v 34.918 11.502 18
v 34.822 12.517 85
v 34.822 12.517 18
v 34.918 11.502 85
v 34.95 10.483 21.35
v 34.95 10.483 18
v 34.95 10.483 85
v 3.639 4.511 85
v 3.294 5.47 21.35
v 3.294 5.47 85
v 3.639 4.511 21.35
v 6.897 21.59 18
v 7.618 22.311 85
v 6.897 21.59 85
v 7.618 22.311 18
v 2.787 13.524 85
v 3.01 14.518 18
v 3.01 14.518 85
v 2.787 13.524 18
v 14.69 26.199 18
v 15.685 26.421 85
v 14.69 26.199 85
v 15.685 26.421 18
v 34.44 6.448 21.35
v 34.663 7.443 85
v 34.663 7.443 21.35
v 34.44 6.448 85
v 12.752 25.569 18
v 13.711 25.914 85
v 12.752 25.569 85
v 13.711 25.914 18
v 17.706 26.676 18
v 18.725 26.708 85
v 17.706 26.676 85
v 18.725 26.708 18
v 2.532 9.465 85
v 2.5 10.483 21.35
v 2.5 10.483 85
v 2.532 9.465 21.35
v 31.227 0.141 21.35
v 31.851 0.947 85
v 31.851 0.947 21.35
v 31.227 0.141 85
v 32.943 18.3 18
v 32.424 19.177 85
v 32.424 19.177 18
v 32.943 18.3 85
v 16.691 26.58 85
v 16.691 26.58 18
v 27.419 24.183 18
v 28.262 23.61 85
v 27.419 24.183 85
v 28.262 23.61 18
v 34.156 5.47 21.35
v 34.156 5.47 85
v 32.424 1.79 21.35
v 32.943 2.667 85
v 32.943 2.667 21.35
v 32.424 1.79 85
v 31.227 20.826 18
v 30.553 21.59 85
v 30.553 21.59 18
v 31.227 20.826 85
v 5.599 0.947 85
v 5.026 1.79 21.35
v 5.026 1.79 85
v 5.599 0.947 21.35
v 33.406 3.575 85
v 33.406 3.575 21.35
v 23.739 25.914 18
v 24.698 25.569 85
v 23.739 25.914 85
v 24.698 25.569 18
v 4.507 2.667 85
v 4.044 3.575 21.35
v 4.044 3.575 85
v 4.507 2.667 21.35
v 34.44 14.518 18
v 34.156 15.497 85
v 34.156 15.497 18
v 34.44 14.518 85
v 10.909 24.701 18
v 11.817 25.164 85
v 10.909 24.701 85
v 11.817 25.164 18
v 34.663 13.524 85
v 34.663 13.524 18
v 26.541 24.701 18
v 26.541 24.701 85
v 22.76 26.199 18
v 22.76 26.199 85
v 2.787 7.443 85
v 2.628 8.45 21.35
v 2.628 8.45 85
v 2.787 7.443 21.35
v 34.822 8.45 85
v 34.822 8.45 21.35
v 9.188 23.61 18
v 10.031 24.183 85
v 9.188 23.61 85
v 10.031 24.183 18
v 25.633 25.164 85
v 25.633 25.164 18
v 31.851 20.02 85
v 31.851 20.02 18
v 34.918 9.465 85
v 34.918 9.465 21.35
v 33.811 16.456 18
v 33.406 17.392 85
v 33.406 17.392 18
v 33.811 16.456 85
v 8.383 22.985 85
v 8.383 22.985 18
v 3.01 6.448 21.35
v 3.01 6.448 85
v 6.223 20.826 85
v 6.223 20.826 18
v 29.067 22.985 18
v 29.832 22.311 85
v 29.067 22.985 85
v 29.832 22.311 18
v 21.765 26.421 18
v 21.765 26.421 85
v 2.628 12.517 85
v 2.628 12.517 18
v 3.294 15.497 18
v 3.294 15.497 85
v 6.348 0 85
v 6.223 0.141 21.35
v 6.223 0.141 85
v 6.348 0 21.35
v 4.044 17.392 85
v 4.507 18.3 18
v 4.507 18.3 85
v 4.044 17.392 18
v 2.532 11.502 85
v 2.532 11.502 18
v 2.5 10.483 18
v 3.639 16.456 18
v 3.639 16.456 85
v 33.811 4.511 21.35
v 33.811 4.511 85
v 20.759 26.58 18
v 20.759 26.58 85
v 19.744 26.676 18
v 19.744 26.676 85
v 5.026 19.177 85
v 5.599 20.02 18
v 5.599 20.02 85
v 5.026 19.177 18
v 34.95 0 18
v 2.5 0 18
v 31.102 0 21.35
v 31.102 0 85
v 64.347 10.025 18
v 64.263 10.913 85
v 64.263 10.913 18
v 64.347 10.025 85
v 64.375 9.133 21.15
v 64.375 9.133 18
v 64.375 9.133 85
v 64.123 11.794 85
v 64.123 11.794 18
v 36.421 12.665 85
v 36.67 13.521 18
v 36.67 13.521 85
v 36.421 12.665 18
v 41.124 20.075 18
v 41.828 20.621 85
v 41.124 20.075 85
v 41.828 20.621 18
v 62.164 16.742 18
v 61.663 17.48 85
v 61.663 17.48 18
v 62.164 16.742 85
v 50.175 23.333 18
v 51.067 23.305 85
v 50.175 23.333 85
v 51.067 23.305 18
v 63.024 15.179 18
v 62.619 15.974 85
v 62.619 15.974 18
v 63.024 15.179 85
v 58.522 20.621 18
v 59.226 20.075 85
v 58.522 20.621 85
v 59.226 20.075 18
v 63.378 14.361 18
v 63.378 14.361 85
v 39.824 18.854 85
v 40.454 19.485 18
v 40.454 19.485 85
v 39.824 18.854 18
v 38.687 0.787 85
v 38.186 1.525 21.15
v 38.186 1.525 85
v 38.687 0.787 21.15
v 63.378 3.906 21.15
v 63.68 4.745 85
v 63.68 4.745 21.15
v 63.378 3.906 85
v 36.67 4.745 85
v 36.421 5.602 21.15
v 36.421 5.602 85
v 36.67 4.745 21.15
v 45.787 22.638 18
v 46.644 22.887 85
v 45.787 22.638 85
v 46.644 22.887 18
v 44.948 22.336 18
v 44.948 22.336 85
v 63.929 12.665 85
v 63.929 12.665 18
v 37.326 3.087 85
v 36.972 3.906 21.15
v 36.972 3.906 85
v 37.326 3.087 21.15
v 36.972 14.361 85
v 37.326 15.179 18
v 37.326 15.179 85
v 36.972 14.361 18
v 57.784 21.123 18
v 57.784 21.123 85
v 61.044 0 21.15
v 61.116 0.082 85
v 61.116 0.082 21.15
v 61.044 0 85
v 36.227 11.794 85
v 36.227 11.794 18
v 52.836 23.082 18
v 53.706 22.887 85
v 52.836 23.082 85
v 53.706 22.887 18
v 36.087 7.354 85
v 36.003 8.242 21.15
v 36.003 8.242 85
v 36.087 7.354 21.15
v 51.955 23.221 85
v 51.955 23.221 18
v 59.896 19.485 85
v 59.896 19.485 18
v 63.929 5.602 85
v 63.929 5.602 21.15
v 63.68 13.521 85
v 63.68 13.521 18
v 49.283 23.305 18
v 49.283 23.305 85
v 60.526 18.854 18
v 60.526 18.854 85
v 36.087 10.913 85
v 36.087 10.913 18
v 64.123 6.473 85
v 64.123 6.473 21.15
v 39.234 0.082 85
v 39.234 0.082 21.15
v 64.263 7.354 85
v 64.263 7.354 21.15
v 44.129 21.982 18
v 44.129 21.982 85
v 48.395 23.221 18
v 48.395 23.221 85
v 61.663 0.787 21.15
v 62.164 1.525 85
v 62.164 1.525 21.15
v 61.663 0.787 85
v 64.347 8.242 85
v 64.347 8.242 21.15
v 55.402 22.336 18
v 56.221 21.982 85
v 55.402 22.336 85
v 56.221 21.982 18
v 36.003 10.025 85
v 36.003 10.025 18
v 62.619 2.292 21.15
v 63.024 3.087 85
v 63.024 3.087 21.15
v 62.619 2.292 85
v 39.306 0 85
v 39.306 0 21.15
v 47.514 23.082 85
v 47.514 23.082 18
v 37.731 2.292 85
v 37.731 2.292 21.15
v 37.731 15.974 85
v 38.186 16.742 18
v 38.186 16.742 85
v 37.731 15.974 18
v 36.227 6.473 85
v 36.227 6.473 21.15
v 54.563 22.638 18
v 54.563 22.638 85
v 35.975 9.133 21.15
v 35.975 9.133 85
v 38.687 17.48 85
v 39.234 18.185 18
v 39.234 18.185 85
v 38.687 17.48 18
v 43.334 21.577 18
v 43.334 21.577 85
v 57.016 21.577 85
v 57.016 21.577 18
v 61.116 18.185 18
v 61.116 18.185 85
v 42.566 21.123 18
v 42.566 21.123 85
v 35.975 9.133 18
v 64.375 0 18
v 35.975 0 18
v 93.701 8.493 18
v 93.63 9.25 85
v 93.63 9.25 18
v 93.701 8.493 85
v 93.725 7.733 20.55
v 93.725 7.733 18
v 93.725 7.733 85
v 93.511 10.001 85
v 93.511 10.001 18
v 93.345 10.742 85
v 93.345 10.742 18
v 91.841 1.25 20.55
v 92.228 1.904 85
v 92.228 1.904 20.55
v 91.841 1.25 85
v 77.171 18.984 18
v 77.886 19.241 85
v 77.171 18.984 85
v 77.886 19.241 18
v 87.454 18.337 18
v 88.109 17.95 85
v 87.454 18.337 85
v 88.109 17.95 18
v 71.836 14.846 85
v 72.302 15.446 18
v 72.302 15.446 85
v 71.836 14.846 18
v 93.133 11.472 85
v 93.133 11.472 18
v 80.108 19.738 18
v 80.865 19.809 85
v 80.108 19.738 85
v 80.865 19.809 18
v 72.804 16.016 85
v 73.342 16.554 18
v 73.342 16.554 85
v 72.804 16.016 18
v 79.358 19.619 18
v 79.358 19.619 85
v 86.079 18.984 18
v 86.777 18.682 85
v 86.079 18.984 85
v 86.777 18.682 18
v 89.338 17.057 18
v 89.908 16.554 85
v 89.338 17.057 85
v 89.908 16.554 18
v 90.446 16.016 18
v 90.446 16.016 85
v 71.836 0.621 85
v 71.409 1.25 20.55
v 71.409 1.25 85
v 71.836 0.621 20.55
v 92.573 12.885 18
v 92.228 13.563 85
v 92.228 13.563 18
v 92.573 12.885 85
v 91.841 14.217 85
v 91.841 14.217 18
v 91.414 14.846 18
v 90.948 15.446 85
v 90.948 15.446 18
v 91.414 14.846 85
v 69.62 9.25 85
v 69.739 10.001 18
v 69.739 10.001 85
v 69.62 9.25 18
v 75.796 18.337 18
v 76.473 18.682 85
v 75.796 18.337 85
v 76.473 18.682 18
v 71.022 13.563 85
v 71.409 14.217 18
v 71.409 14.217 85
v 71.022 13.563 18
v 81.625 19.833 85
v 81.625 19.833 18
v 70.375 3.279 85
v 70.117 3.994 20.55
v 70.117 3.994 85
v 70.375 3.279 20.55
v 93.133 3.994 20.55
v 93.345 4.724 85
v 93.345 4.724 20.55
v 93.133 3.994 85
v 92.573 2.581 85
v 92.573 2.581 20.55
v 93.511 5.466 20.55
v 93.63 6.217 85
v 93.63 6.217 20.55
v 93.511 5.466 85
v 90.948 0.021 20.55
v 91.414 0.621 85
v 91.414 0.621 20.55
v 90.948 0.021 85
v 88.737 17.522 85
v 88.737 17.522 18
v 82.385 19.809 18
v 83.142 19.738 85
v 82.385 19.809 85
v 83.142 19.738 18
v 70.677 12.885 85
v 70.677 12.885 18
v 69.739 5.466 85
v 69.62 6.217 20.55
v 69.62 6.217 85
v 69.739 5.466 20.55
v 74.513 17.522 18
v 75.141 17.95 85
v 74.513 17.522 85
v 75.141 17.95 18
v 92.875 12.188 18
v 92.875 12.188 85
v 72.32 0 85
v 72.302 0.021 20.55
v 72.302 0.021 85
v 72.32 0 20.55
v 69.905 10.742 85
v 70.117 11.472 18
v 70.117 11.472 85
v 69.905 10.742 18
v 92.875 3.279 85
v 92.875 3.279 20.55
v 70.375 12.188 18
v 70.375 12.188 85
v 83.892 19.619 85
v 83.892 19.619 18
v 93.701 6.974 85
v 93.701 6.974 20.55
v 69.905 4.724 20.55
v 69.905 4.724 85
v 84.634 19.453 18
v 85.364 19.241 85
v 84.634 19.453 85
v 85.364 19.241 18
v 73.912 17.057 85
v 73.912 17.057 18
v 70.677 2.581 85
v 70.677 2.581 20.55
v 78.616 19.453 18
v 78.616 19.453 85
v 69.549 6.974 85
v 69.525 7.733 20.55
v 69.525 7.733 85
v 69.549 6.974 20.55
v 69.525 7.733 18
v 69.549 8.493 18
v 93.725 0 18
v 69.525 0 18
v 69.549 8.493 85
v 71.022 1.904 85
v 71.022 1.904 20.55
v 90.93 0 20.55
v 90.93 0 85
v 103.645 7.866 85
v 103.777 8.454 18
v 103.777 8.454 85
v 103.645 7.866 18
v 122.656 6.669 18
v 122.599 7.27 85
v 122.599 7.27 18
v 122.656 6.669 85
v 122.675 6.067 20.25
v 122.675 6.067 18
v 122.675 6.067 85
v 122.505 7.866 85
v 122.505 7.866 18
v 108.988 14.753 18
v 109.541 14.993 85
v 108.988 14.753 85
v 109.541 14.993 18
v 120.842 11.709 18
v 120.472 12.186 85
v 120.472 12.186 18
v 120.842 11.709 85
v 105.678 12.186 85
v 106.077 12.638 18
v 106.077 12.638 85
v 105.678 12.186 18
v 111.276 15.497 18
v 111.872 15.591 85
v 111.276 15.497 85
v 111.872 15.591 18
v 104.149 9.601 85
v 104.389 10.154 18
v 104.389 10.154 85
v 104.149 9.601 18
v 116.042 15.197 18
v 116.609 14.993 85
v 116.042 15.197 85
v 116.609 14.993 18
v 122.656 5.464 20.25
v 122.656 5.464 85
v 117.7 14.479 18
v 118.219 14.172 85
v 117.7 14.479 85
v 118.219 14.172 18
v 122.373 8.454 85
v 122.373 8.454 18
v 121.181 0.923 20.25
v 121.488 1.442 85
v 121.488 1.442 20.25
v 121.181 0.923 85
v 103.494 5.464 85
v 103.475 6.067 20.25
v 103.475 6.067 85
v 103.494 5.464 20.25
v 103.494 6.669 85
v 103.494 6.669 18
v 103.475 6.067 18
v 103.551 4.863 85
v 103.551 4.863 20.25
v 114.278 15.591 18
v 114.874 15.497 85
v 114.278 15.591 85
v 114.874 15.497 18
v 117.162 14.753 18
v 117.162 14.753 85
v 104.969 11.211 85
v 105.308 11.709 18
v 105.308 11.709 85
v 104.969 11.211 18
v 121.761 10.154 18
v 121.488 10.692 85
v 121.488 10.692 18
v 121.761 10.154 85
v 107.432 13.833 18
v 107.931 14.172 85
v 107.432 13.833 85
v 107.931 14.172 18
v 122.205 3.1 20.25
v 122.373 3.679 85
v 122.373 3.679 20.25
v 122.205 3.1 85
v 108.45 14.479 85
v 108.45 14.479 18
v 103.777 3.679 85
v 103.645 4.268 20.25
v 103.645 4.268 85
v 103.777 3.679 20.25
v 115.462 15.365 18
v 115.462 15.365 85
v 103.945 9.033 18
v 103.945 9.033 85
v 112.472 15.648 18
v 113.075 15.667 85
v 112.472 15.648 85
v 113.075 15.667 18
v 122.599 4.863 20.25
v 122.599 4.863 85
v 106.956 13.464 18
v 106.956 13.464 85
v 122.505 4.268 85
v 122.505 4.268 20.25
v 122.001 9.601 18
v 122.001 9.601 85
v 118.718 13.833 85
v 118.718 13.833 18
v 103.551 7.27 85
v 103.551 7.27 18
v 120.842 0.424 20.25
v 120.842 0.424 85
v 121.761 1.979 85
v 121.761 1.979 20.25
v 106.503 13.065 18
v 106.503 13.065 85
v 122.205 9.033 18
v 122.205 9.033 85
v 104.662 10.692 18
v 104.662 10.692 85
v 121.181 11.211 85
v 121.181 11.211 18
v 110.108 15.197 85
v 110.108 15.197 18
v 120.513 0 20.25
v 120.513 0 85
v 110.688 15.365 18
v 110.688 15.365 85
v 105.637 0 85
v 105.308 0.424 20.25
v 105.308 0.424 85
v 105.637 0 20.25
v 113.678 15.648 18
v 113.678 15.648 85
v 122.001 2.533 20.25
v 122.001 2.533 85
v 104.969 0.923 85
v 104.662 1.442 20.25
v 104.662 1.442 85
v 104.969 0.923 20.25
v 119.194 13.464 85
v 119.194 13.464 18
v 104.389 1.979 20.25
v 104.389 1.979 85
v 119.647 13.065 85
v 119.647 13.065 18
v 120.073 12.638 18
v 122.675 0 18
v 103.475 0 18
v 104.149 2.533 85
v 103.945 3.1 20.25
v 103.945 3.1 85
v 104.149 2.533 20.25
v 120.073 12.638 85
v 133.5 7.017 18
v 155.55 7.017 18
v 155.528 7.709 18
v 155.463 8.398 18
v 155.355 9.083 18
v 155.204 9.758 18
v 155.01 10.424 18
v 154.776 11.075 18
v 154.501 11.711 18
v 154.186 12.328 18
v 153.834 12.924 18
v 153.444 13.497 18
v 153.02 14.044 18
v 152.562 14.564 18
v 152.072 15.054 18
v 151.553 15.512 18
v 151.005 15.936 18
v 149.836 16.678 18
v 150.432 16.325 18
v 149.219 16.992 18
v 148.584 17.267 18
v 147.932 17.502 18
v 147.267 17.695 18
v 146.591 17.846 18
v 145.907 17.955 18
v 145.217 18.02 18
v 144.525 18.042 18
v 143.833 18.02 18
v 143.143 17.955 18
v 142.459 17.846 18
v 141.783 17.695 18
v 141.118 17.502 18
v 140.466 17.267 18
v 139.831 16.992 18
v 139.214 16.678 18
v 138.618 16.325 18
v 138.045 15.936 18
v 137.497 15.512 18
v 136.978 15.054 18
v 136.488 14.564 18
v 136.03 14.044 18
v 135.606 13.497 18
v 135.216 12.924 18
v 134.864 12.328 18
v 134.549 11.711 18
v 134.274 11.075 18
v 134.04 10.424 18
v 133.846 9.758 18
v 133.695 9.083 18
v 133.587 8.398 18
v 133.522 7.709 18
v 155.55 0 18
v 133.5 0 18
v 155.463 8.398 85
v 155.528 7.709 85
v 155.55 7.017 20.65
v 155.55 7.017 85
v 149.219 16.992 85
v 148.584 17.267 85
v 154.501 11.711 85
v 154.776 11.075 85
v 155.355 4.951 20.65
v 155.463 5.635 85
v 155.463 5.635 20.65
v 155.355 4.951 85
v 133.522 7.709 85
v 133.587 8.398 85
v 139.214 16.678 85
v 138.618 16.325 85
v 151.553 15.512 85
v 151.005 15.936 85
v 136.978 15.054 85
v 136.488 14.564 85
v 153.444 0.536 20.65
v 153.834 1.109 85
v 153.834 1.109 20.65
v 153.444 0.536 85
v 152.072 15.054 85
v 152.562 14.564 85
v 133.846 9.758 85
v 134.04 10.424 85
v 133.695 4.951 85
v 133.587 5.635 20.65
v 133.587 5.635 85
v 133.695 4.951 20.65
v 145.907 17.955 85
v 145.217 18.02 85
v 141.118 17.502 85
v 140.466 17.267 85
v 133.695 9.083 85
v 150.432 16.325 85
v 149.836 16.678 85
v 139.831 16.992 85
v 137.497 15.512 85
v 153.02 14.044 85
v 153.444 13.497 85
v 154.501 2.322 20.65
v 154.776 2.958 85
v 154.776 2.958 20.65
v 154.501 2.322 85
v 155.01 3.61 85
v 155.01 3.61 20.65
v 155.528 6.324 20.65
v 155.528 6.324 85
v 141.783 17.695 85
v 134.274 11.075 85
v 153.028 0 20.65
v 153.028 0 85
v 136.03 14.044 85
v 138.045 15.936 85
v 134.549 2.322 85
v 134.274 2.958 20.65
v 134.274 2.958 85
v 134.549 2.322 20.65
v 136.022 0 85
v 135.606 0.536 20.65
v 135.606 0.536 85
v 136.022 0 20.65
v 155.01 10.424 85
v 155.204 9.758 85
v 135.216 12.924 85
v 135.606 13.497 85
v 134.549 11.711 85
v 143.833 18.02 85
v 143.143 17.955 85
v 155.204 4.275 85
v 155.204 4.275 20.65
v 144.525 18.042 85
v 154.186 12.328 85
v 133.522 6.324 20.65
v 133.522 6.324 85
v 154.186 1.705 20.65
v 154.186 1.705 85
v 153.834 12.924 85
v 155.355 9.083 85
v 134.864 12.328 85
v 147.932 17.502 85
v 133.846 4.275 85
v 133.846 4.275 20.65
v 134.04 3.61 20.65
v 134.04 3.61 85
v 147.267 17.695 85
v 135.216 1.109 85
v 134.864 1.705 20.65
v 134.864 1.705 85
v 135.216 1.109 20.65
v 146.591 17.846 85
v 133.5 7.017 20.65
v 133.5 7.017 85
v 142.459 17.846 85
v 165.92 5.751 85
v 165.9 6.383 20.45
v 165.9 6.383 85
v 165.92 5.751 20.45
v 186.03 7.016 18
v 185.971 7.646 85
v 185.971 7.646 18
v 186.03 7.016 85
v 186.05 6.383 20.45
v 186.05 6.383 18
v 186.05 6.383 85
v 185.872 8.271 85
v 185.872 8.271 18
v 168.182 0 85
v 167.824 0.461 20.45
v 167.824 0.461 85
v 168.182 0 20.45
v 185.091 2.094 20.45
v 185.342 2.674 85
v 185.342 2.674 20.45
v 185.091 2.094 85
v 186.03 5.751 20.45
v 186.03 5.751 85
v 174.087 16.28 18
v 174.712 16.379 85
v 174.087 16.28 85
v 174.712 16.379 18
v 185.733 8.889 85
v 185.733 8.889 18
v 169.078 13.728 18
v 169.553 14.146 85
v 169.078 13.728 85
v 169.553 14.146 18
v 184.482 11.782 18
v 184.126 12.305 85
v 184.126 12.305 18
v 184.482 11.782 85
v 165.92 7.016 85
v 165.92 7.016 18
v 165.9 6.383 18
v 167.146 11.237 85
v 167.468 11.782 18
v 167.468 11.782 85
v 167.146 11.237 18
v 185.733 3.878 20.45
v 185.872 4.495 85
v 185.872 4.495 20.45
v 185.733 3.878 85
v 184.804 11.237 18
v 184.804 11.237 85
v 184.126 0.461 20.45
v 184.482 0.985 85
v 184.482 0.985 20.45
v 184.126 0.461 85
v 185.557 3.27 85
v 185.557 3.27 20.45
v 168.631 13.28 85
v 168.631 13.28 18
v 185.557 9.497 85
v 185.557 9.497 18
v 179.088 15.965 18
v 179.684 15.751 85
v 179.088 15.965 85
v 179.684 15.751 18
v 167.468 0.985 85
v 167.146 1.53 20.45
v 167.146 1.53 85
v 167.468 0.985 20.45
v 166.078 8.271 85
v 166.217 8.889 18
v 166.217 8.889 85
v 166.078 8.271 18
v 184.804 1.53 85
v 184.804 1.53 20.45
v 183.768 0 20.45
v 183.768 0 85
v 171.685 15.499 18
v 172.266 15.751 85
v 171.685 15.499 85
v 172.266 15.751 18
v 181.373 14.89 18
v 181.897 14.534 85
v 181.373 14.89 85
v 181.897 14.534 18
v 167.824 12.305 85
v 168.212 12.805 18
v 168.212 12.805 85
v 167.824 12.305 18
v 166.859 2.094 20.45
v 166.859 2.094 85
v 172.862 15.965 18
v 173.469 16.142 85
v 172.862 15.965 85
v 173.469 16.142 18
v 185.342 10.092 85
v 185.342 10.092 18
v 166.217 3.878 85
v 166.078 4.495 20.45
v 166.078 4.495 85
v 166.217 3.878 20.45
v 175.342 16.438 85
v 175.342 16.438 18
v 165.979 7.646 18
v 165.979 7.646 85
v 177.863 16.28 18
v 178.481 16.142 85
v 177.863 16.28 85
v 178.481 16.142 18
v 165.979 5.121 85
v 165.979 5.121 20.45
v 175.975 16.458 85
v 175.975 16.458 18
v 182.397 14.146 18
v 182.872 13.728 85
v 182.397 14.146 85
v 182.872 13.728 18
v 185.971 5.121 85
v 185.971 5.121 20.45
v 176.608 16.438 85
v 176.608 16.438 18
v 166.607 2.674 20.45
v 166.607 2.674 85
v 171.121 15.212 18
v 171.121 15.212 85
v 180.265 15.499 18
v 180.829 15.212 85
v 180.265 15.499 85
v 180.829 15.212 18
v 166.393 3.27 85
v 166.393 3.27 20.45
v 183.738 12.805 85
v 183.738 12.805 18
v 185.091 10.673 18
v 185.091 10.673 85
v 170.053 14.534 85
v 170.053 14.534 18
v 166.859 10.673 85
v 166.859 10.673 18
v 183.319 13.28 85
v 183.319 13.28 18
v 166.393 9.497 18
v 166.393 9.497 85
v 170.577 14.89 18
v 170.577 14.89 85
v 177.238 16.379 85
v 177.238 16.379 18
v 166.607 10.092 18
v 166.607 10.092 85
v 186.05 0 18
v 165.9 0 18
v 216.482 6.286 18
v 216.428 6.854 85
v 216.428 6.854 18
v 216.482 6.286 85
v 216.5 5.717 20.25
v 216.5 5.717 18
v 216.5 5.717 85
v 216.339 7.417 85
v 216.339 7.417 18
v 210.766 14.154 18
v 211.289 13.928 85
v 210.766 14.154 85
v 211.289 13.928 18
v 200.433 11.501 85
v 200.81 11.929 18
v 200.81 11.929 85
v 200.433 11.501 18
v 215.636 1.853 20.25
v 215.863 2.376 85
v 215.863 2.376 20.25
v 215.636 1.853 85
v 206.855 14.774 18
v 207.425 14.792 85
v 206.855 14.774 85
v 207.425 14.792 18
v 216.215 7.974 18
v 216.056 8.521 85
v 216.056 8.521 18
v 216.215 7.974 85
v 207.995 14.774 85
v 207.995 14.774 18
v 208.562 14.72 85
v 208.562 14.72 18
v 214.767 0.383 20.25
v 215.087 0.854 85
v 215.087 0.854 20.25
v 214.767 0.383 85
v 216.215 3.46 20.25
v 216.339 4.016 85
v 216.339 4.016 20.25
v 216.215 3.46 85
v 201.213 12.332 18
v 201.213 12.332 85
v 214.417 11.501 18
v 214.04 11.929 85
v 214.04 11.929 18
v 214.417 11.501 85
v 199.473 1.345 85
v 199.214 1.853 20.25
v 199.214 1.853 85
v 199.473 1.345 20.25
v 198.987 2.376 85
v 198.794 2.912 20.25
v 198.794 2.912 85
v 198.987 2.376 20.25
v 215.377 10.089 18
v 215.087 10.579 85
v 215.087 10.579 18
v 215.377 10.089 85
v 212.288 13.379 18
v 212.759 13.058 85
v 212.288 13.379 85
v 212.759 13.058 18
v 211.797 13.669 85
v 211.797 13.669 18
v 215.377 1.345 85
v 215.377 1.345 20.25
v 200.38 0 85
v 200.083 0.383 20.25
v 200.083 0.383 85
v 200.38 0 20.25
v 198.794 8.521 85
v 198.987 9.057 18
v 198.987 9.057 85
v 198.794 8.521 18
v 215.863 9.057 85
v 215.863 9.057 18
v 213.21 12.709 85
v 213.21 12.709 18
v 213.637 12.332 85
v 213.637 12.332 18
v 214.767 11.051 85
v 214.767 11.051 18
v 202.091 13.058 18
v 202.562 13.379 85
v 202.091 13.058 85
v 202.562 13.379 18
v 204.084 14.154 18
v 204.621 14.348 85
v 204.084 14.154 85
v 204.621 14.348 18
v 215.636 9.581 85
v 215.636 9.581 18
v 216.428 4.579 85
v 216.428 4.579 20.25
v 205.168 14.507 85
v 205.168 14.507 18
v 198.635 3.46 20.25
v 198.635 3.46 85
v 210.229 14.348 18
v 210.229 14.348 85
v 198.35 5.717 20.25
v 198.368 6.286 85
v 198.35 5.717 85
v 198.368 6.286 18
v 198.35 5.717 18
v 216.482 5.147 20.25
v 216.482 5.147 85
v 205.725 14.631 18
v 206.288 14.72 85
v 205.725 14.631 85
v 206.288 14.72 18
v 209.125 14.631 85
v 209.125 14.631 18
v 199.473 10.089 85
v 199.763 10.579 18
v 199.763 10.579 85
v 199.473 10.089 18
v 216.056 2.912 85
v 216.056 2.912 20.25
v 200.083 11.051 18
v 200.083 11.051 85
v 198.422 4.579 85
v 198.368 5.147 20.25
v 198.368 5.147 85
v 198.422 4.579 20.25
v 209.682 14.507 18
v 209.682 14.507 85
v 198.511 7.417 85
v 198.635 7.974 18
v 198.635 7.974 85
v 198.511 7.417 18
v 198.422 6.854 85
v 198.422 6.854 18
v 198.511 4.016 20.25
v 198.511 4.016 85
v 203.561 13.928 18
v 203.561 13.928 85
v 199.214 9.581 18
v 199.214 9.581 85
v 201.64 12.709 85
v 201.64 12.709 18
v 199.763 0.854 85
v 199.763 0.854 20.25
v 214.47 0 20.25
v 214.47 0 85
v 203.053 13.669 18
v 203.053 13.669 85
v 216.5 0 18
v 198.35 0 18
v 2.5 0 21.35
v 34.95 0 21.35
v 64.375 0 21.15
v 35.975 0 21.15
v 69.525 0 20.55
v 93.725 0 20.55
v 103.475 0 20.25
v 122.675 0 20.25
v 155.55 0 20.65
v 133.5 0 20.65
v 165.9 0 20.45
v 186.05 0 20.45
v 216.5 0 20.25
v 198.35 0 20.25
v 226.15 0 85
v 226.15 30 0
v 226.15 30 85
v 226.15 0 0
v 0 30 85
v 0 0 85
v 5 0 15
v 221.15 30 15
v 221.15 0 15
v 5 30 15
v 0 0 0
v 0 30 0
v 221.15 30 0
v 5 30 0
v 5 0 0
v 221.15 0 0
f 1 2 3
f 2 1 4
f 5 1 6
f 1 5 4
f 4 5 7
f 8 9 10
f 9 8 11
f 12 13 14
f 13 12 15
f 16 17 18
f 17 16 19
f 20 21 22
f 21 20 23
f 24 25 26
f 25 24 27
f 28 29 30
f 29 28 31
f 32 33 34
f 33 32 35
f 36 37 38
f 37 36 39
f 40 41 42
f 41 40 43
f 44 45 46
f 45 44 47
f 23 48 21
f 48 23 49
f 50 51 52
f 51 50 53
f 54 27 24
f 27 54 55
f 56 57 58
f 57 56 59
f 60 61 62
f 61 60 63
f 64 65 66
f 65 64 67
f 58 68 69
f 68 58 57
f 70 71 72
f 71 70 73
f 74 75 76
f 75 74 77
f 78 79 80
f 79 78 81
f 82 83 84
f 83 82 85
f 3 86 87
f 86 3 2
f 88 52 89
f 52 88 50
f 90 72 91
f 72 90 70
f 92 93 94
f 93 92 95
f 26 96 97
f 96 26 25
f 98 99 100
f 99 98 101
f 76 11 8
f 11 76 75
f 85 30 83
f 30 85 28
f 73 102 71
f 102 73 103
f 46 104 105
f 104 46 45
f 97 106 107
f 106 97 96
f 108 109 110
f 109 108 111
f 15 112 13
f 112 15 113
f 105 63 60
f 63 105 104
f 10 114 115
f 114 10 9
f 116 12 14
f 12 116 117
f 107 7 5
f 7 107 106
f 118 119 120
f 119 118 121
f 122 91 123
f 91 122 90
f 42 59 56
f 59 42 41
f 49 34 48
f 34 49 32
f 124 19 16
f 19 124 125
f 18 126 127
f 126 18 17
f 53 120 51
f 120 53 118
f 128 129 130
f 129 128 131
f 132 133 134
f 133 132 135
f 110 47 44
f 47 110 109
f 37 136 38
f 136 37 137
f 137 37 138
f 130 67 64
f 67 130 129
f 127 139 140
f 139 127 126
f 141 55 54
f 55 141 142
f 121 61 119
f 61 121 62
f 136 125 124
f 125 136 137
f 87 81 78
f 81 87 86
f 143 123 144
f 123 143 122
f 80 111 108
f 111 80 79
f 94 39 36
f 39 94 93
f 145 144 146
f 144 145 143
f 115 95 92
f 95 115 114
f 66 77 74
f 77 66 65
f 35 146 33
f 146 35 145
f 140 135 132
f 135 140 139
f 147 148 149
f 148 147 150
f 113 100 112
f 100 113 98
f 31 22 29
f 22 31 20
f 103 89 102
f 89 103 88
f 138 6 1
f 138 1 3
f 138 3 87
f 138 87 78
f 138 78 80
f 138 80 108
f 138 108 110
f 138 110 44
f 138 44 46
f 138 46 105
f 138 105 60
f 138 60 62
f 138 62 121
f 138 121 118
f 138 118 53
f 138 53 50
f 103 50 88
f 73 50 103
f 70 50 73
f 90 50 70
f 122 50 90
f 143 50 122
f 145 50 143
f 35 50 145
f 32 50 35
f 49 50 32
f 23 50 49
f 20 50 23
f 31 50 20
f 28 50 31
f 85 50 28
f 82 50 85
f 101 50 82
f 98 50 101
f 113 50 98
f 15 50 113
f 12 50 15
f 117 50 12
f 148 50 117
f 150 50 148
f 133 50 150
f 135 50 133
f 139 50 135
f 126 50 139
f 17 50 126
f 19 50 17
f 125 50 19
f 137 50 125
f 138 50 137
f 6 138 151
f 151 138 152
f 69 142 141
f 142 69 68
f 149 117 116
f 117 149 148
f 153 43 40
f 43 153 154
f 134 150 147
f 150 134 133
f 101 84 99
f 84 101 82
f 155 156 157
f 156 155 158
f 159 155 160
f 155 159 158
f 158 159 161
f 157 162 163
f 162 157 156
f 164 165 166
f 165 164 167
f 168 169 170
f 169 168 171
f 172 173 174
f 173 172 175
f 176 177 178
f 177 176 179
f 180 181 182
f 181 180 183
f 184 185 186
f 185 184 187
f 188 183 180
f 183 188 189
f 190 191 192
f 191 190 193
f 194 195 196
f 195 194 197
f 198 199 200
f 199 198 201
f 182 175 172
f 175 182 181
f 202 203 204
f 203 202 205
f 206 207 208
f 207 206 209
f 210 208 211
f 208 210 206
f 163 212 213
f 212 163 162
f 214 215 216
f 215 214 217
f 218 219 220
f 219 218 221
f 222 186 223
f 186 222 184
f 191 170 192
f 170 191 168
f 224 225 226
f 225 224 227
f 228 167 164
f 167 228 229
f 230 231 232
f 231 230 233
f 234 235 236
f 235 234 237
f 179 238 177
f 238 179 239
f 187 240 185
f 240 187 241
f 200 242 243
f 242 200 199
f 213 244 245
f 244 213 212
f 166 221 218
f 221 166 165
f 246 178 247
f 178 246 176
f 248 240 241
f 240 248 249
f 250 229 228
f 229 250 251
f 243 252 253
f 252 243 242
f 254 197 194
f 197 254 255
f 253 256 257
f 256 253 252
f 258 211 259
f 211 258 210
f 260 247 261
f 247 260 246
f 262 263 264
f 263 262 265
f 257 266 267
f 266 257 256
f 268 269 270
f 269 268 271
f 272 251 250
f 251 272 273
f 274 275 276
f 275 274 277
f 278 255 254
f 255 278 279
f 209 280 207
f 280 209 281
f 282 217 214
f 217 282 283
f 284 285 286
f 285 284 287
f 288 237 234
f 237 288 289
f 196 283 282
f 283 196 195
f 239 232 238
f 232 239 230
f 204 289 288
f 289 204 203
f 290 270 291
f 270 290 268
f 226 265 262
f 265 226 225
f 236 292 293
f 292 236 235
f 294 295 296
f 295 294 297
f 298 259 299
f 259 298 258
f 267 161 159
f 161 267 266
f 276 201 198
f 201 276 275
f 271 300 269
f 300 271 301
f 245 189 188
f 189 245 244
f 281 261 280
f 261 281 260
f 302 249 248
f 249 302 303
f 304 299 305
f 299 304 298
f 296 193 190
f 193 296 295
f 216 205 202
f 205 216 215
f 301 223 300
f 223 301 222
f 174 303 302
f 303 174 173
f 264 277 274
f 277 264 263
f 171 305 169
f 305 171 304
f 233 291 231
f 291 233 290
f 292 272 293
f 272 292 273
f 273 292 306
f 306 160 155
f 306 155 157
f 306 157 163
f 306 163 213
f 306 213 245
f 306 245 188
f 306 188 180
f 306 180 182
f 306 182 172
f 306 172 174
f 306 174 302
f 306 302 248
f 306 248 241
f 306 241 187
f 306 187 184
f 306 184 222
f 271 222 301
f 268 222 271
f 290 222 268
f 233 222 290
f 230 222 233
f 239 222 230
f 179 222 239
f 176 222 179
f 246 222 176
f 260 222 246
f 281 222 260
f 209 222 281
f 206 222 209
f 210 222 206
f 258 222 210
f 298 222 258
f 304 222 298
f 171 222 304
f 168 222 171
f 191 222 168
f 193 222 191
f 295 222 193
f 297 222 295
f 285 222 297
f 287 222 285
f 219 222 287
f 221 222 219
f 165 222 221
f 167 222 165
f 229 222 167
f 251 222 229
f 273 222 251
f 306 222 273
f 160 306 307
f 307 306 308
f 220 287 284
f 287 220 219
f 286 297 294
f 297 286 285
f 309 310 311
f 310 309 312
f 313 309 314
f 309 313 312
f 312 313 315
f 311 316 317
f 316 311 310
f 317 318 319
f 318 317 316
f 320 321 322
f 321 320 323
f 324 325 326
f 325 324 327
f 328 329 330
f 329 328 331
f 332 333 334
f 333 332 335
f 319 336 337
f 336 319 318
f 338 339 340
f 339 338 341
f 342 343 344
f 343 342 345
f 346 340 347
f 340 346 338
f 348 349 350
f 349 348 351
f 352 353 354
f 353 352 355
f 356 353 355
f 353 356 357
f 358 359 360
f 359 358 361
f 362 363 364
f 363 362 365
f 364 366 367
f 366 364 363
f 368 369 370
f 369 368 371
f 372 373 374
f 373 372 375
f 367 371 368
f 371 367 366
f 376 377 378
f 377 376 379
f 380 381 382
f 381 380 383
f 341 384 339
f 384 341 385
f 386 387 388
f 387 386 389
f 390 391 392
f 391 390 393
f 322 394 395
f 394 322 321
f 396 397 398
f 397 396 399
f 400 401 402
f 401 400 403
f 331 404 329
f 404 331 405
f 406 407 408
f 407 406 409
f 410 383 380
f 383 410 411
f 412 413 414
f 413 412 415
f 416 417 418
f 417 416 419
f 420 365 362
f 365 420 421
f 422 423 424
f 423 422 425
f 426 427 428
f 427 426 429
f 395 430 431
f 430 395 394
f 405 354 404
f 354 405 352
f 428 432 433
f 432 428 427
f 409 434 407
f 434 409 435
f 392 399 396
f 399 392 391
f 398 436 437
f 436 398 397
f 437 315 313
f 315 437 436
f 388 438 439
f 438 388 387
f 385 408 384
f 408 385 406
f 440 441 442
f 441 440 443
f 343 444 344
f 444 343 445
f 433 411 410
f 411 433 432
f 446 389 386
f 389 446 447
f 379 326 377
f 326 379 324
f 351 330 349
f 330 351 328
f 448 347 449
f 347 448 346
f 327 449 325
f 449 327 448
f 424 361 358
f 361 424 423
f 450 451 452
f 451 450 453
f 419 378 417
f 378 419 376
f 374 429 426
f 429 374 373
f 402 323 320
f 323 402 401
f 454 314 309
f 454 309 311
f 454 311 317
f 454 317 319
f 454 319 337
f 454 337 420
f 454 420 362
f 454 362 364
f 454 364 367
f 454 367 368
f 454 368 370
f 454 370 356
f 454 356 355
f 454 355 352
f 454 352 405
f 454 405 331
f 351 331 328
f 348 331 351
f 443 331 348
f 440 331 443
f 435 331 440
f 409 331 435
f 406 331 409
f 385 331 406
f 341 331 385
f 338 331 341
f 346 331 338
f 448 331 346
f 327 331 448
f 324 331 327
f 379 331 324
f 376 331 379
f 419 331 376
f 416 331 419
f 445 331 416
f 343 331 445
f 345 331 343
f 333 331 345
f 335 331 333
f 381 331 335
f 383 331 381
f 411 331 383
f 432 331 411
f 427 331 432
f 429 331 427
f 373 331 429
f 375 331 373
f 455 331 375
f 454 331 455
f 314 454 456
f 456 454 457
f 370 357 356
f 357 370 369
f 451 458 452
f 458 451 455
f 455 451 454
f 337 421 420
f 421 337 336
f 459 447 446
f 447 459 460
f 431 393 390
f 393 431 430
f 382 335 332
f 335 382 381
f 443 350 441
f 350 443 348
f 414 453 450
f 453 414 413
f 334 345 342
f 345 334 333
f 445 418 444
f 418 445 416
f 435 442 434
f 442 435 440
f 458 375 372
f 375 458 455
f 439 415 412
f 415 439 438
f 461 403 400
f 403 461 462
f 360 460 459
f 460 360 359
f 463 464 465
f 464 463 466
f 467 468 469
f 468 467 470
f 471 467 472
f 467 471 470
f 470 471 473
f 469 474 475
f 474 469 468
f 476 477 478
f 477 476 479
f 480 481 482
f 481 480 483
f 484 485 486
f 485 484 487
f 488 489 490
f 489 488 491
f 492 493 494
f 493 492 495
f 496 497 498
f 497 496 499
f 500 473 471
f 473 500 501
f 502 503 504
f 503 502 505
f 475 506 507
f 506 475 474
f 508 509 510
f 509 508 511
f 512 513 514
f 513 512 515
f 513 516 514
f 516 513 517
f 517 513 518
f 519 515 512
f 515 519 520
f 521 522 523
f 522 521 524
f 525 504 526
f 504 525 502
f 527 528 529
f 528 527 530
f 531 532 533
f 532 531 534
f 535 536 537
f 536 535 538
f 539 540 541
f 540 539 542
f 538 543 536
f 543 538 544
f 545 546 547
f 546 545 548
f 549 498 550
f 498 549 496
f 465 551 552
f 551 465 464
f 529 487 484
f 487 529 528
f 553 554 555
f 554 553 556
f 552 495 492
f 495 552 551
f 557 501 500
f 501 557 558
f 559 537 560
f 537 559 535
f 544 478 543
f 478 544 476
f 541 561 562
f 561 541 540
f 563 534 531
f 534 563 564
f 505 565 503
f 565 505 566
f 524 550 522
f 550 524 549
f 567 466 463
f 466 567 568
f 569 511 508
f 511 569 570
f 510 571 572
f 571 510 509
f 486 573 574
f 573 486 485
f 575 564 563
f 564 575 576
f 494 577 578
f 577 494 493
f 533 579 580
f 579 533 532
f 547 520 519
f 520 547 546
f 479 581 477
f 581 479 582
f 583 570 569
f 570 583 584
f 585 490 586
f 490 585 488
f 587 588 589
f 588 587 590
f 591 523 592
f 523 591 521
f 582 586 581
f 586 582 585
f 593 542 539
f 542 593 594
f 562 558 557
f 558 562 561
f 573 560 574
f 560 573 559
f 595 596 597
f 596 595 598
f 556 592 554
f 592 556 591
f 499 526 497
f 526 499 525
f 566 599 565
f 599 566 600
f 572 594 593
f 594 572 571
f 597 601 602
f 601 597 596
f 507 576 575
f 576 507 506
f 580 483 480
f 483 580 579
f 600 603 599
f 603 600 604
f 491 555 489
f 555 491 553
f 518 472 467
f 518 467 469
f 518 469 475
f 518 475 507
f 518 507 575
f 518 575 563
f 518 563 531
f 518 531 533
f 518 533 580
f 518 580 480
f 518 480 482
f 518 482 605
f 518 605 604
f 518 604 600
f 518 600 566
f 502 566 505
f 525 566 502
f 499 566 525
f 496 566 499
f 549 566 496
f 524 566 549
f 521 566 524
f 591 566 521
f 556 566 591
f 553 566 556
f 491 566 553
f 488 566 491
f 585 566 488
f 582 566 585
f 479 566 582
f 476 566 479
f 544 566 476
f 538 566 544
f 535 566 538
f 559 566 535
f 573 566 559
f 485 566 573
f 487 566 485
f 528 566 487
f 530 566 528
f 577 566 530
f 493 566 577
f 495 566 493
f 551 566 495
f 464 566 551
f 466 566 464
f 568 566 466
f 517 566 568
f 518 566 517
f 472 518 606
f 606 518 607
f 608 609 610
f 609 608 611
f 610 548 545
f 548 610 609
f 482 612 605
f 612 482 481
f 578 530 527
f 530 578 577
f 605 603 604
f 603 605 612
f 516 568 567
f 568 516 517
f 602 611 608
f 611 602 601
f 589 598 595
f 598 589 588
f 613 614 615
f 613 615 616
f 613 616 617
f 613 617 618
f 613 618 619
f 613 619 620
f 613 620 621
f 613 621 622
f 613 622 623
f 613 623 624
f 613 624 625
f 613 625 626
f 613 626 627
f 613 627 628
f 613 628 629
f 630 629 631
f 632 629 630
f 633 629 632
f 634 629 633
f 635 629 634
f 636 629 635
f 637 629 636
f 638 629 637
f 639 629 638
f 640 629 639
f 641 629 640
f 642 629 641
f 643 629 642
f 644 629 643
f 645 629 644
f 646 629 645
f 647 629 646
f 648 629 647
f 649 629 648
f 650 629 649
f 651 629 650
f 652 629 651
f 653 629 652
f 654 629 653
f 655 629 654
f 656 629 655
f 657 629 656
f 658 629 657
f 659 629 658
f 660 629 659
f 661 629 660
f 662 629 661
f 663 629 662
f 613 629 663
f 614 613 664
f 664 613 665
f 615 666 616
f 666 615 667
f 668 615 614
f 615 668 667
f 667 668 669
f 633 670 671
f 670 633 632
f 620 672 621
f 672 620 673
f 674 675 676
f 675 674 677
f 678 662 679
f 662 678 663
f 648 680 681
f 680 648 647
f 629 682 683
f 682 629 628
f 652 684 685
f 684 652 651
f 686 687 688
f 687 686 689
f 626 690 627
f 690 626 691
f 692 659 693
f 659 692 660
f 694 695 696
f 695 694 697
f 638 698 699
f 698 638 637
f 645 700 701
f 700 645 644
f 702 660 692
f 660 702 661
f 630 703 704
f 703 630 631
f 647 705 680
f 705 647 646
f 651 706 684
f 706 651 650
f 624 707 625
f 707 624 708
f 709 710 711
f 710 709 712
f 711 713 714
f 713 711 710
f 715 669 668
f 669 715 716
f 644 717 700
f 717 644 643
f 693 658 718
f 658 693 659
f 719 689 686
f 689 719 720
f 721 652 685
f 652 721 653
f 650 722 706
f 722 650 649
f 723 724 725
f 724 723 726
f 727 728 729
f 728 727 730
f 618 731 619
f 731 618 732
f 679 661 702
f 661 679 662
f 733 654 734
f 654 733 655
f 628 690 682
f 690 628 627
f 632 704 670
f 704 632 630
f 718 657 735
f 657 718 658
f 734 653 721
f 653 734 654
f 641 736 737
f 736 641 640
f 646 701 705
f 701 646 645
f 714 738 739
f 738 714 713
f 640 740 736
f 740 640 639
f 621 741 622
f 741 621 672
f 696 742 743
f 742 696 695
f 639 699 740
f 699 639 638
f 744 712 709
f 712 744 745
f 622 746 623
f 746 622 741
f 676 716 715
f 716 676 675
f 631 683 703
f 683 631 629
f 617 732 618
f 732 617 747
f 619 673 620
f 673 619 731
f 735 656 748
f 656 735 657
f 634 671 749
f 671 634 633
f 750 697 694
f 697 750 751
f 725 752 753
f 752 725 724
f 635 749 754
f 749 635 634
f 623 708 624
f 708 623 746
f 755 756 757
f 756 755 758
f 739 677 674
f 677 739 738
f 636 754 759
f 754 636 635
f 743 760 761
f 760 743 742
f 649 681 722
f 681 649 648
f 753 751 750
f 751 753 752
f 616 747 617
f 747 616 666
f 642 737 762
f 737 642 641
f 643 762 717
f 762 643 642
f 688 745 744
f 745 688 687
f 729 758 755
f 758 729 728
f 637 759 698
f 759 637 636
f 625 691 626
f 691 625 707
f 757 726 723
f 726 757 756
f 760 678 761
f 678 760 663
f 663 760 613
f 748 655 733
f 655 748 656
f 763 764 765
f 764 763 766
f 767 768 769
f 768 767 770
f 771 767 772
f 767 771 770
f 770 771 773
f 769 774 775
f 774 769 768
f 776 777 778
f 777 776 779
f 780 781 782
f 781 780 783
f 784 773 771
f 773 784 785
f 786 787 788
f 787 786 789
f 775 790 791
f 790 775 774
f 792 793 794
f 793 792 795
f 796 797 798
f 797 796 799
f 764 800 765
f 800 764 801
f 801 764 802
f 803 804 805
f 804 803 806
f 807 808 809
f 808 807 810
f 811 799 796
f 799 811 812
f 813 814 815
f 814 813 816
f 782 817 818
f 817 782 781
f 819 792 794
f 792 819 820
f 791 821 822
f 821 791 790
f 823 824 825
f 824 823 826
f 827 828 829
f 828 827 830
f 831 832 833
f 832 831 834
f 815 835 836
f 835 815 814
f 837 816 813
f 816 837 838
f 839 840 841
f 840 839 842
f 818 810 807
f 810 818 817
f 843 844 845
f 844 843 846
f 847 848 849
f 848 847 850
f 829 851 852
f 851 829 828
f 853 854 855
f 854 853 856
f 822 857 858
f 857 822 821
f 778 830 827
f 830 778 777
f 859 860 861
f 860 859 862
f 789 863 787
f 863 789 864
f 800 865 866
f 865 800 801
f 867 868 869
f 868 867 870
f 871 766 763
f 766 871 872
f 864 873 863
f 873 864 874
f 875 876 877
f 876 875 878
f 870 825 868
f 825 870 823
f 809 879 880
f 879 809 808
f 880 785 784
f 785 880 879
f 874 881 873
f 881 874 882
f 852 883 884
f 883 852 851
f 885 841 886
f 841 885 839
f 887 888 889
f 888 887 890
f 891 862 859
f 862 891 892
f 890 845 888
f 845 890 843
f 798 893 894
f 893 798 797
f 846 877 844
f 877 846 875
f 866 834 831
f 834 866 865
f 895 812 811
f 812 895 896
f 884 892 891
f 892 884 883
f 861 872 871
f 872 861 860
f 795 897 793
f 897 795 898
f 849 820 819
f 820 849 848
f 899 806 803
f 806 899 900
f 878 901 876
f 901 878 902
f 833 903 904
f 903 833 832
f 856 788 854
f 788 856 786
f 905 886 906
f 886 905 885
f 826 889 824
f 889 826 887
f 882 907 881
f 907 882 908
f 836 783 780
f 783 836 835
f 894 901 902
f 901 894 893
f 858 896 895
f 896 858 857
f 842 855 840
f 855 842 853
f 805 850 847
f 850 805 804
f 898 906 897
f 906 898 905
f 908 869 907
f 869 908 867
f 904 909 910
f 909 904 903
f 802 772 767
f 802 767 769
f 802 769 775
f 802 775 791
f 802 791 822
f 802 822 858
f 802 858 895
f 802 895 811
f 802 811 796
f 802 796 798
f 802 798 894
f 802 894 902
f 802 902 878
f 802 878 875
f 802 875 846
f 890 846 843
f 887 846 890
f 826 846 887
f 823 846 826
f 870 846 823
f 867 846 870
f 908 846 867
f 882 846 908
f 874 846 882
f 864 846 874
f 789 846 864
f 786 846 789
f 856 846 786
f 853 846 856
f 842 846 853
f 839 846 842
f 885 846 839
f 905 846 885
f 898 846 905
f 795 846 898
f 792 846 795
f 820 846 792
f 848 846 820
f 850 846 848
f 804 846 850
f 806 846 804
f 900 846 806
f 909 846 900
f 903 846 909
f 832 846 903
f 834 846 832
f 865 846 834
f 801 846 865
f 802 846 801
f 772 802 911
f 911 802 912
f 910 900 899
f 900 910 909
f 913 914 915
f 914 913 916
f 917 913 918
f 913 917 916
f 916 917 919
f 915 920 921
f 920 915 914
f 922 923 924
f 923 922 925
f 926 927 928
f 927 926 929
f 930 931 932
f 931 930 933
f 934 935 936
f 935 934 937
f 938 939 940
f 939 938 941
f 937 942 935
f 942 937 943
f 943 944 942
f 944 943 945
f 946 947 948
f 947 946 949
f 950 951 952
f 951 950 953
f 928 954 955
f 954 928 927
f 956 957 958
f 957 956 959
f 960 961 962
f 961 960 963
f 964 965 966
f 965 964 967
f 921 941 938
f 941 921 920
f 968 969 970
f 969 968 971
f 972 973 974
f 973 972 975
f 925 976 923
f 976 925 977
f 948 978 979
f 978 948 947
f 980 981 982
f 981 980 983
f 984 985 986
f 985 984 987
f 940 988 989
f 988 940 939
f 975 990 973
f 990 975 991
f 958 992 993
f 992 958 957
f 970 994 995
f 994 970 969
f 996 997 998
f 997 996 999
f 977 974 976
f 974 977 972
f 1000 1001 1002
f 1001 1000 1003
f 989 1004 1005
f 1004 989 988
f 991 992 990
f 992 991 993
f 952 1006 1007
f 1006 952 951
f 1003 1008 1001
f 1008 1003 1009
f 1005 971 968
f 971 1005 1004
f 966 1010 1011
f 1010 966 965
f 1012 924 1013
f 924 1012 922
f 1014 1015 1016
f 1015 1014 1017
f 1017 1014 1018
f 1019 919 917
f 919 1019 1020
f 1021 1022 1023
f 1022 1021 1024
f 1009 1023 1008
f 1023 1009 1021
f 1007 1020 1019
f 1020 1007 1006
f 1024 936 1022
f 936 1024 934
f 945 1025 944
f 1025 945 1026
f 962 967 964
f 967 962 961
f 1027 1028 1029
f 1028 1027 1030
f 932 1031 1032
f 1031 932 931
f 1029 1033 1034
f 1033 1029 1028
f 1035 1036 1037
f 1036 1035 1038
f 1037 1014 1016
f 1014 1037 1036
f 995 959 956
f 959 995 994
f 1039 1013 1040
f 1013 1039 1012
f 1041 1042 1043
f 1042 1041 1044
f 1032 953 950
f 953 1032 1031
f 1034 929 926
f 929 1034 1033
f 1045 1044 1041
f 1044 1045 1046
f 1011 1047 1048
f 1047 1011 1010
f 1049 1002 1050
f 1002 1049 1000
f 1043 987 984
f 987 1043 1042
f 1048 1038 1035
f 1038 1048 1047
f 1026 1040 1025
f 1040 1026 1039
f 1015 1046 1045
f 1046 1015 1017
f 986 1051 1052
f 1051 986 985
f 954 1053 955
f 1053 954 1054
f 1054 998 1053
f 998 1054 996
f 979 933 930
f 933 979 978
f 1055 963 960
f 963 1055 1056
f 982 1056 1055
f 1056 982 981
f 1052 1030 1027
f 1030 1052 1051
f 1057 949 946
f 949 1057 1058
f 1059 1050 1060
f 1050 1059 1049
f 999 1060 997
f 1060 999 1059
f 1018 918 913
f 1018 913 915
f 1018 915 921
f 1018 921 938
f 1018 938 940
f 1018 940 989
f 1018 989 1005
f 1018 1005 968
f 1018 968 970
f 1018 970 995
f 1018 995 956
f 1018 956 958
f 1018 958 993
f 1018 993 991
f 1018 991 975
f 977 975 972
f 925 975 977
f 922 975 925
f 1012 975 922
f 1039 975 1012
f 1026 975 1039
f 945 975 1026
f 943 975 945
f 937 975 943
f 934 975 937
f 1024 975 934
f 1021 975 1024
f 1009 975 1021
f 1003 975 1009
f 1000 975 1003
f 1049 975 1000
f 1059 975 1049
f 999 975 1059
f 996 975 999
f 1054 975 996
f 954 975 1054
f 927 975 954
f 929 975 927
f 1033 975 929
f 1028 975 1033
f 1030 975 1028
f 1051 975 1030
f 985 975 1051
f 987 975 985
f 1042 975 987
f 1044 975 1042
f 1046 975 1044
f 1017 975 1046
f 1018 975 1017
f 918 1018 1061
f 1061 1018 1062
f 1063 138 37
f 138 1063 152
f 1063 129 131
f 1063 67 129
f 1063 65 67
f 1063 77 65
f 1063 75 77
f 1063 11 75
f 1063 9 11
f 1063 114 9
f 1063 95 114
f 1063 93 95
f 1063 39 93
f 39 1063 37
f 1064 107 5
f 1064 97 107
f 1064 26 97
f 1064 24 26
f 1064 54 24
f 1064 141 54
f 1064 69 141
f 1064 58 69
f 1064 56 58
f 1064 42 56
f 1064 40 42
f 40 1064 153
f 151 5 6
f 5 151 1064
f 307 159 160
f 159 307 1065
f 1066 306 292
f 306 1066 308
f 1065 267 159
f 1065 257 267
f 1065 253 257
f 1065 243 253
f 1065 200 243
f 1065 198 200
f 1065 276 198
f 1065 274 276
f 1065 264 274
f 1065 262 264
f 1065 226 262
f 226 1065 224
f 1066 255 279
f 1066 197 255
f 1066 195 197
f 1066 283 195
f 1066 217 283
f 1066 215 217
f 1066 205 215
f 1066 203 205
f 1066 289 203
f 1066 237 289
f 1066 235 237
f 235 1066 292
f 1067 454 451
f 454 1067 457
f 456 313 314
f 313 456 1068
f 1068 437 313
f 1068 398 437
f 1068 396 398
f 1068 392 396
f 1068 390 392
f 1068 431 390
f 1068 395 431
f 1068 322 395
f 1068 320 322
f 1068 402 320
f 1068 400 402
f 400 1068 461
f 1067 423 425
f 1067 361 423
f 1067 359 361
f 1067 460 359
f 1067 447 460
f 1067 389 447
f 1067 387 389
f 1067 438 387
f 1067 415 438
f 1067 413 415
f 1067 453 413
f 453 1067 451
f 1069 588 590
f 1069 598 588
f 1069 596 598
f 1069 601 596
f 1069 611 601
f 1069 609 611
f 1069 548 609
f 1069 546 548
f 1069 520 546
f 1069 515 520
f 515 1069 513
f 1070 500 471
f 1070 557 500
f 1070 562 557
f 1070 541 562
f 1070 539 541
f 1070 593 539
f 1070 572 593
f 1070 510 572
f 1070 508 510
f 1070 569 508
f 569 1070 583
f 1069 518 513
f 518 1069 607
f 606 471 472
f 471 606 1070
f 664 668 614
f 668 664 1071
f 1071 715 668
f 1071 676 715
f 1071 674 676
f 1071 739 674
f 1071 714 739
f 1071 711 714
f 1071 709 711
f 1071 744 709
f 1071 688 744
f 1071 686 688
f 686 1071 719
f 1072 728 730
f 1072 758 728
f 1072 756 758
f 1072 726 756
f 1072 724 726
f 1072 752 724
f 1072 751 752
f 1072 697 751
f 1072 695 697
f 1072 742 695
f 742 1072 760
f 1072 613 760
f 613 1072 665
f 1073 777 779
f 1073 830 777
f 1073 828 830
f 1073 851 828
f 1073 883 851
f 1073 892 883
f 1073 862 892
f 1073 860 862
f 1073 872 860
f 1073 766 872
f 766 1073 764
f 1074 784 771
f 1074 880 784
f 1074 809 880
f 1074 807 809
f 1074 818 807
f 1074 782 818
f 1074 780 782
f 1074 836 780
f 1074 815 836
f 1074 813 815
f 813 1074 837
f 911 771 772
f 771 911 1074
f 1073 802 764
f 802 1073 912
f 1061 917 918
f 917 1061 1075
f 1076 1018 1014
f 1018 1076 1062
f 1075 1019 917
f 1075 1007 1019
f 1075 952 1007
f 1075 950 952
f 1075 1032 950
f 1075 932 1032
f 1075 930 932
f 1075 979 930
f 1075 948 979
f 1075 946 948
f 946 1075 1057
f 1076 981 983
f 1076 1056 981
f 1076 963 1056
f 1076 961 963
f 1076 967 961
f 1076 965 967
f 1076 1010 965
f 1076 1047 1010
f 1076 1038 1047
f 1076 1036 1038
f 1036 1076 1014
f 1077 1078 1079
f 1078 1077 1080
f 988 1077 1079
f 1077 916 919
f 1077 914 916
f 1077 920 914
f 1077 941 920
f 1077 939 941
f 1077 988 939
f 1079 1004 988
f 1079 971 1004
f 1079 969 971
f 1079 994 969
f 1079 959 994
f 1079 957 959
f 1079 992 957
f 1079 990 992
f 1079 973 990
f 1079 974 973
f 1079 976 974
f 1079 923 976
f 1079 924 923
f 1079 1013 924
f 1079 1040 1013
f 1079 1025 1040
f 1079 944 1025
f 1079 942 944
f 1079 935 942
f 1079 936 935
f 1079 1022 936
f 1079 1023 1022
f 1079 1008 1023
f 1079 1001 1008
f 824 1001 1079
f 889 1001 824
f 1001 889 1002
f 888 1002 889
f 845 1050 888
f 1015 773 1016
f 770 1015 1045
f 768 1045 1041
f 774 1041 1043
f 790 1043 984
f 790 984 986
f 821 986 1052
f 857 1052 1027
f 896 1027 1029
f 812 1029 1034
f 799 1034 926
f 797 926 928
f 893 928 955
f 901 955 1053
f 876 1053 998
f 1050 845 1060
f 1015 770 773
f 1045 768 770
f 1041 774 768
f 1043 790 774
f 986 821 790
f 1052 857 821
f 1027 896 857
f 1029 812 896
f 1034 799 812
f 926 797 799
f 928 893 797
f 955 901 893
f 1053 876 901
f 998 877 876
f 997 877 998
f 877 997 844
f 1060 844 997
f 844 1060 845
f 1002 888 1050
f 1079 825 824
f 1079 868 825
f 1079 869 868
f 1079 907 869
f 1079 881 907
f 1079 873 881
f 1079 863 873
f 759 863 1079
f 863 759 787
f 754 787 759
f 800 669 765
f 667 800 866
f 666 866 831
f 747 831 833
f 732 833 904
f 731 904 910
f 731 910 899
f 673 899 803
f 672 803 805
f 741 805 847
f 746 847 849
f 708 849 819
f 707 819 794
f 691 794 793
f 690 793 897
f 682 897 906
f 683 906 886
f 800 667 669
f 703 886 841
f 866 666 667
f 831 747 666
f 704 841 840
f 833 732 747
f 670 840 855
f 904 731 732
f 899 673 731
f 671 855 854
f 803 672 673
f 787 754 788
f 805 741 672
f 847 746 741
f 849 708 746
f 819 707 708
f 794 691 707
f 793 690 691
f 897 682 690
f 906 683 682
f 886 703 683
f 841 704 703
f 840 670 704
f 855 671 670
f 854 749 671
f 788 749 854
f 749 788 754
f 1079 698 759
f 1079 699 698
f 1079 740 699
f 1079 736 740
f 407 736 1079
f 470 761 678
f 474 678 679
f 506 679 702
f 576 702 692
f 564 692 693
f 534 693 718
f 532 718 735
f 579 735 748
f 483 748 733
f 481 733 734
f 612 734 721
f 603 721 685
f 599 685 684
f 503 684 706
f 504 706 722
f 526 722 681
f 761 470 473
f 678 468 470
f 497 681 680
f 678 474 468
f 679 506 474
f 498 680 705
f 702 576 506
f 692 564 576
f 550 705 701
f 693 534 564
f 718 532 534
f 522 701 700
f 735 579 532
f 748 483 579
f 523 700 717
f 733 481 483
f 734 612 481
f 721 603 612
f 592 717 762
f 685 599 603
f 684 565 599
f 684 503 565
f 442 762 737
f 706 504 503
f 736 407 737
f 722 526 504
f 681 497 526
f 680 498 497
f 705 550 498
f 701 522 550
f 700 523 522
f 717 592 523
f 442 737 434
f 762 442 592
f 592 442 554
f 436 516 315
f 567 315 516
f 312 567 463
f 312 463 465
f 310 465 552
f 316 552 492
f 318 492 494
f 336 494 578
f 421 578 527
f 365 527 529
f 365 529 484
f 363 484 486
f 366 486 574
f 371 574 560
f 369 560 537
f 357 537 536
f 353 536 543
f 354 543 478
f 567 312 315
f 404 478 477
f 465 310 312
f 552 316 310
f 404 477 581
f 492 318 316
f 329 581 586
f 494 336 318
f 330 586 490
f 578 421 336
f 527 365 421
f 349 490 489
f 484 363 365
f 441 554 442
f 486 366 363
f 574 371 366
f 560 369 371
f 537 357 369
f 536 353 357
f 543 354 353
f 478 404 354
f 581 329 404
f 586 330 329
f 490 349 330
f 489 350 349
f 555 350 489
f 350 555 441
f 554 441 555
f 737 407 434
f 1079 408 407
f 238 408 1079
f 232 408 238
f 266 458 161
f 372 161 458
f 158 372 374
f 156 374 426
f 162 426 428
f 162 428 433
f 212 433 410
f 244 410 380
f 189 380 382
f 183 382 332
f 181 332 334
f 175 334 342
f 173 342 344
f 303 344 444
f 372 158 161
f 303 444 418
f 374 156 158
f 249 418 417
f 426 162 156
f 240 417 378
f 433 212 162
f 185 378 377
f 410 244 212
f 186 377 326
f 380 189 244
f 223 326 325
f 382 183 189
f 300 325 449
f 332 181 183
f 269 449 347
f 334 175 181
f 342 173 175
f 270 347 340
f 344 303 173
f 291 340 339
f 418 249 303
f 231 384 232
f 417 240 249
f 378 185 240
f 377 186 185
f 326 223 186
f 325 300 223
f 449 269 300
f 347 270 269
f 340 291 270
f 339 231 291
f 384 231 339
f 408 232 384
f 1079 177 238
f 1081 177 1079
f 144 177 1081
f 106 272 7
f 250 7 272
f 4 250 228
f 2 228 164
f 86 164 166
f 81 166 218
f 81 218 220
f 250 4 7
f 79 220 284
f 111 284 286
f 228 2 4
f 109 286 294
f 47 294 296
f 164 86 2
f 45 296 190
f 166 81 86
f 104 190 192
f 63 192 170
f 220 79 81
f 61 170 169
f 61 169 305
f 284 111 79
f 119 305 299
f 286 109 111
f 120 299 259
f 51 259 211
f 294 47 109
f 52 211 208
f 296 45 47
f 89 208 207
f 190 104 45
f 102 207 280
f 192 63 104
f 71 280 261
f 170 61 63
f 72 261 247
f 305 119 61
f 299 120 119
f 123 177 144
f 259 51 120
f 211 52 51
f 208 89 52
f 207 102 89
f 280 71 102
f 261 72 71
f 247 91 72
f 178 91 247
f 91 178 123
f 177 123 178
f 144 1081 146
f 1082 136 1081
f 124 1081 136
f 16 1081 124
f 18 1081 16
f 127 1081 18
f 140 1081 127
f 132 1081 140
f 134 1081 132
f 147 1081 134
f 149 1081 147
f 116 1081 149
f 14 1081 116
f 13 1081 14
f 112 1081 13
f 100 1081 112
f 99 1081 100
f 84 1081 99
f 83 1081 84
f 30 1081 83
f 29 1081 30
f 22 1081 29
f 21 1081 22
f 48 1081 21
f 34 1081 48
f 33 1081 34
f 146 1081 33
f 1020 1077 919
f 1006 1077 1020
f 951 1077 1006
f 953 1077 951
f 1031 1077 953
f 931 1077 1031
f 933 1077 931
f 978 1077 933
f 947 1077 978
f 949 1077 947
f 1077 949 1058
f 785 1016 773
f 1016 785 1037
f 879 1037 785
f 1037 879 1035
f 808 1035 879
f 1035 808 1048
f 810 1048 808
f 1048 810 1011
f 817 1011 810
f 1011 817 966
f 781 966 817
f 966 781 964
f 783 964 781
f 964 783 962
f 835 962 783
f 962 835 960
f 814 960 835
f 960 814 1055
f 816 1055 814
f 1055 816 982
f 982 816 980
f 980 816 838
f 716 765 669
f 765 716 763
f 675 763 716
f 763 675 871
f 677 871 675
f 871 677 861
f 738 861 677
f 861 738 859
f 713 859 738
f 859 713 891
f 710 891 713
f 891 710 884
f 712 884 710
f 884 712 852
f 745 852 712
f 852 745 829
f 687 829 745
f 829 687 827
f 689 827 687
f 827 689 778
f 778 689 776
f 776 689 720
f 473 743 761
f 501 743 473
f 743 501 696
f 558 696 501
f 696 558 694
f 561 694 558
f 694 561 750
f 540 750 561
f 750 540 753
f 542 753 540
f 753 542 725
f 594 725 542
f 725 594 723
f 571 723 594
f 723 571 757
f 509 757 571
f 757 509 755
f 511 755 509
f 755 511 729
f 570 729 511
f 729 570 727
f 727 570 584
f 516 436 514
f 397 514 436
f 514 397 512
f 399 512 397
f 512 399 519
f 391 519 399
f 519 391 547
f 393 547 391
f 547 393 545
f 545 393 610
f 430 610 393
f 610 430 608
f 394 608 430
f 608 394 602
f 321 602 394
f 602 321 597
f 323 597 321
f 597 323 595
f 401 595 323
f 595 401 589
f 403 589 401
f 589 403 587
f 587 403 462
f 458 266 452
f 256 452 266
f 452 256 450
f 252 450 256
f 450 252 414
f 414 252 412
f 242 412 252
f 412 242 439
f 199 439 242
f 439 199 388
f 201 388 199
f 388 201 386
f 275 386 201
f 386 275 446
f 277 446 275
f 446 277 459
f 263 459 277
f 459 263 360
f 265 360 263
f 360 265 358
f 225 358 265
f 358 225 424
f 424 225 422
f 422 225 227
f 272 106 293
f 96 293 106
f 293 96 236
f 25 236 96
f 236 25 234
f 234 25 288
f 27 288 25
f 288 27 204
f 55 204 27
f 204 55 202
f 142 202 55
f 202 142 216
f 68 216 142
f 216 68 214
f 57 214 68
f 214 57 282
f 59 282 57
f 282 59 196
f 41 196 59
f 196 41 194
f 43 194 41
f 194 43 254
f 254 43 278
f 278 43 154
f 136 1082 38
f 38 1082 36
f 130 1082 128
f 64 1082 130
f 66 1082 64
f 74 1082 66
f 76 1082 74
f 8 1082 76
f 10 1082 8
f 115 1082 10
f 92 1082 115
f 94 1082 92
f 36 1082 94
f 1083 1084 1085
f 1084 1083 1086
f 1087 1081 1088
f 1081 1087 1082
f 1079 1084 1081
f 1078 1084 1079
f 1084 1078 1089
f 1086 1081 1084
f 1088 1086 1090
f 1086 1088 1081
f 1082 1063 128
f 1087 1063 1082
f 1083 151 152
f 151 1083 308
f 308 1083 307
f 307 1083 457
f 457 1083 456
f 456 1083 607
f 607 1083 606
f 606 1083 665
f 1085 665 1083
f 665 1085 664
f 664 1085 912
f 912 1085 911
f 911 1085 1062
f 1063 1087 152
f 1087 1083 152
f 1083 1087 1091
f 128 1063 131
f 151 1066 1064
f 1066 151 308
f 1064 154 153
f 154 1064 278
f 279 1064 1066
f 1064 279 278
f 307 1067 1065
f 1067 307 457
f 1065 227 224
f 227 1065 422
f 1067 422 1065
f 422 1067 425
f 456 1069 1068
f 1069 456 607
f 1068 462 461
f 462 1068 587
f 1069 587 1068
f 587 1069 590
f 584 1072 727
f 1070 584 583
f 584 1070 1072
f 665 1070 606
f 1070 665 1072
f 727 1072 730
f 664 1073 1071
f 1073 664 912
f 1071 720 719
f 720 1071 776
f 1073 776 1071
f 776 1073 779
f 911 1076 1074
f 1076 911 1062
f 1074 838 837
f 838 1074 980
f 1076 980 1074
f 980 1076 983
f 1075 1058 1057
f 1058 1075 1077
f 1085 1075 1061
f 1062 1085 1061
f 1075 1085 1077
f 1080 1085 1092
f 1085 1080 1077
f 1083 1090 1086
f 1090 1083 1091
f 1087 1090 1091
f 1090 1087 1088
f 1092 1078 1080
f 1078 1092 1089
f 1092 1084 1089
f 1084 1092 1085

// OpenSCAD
// from http://www.snb.ch/de/iabout/cash/id/cash_coins
diameters=[31.45, 27.40, 23.20, 18.20, 21.05, 19.15, 17.15 ];
heights=[2.35, 2.15, 1.55, 1.25, 1.65, 1.45, 1.25];

num_coins = 7;

circle_accuracy=100;

//extra diameter for the coin to slide
extradiameter=1;


height=70;
wall=3;
width=7*diameters[0]+2*wall;
depth=30;

echo("width=",width," depth=",depth," height=",height);

module coinholder(){
  difference(){
	 cube([width,depth,height]);
	 for(i=[0:6]){
	  translate([wall+diameters[0]/2+i*diameters[0],diameters[i]/3,wall]){
	    cylinder(r=(diameters[i]+extradiameter)/2,h=height,$fn=circle_accuracy);
    }
   }



	//slots to pull out
	for(i=[0:6]){
    hull(){
    translate([wall+diameters[0]/2+i*diameters[0],diameters[i]/3,wall]){
	    cylinder(r=(diameters[i]+extradiameter)/2,h=heights[i]+1,$fn=circle_accuracy);
    }
	  translate([wall+diameters[0]/2+i*diameters[0],0,wall]){
	    cylinder(r=(diameters[i]+extradiameter)/2,h=heights[i]+1,$fn=circle_accuracy);
    }
    }
   }

 }//end of difference
  
}

module foot(){
 cube([5,depth,16]);
}

translate([0,0,15]){
 coinholder();
}
foot();
translate([width-5,0,0]){
 foot();
}
//
